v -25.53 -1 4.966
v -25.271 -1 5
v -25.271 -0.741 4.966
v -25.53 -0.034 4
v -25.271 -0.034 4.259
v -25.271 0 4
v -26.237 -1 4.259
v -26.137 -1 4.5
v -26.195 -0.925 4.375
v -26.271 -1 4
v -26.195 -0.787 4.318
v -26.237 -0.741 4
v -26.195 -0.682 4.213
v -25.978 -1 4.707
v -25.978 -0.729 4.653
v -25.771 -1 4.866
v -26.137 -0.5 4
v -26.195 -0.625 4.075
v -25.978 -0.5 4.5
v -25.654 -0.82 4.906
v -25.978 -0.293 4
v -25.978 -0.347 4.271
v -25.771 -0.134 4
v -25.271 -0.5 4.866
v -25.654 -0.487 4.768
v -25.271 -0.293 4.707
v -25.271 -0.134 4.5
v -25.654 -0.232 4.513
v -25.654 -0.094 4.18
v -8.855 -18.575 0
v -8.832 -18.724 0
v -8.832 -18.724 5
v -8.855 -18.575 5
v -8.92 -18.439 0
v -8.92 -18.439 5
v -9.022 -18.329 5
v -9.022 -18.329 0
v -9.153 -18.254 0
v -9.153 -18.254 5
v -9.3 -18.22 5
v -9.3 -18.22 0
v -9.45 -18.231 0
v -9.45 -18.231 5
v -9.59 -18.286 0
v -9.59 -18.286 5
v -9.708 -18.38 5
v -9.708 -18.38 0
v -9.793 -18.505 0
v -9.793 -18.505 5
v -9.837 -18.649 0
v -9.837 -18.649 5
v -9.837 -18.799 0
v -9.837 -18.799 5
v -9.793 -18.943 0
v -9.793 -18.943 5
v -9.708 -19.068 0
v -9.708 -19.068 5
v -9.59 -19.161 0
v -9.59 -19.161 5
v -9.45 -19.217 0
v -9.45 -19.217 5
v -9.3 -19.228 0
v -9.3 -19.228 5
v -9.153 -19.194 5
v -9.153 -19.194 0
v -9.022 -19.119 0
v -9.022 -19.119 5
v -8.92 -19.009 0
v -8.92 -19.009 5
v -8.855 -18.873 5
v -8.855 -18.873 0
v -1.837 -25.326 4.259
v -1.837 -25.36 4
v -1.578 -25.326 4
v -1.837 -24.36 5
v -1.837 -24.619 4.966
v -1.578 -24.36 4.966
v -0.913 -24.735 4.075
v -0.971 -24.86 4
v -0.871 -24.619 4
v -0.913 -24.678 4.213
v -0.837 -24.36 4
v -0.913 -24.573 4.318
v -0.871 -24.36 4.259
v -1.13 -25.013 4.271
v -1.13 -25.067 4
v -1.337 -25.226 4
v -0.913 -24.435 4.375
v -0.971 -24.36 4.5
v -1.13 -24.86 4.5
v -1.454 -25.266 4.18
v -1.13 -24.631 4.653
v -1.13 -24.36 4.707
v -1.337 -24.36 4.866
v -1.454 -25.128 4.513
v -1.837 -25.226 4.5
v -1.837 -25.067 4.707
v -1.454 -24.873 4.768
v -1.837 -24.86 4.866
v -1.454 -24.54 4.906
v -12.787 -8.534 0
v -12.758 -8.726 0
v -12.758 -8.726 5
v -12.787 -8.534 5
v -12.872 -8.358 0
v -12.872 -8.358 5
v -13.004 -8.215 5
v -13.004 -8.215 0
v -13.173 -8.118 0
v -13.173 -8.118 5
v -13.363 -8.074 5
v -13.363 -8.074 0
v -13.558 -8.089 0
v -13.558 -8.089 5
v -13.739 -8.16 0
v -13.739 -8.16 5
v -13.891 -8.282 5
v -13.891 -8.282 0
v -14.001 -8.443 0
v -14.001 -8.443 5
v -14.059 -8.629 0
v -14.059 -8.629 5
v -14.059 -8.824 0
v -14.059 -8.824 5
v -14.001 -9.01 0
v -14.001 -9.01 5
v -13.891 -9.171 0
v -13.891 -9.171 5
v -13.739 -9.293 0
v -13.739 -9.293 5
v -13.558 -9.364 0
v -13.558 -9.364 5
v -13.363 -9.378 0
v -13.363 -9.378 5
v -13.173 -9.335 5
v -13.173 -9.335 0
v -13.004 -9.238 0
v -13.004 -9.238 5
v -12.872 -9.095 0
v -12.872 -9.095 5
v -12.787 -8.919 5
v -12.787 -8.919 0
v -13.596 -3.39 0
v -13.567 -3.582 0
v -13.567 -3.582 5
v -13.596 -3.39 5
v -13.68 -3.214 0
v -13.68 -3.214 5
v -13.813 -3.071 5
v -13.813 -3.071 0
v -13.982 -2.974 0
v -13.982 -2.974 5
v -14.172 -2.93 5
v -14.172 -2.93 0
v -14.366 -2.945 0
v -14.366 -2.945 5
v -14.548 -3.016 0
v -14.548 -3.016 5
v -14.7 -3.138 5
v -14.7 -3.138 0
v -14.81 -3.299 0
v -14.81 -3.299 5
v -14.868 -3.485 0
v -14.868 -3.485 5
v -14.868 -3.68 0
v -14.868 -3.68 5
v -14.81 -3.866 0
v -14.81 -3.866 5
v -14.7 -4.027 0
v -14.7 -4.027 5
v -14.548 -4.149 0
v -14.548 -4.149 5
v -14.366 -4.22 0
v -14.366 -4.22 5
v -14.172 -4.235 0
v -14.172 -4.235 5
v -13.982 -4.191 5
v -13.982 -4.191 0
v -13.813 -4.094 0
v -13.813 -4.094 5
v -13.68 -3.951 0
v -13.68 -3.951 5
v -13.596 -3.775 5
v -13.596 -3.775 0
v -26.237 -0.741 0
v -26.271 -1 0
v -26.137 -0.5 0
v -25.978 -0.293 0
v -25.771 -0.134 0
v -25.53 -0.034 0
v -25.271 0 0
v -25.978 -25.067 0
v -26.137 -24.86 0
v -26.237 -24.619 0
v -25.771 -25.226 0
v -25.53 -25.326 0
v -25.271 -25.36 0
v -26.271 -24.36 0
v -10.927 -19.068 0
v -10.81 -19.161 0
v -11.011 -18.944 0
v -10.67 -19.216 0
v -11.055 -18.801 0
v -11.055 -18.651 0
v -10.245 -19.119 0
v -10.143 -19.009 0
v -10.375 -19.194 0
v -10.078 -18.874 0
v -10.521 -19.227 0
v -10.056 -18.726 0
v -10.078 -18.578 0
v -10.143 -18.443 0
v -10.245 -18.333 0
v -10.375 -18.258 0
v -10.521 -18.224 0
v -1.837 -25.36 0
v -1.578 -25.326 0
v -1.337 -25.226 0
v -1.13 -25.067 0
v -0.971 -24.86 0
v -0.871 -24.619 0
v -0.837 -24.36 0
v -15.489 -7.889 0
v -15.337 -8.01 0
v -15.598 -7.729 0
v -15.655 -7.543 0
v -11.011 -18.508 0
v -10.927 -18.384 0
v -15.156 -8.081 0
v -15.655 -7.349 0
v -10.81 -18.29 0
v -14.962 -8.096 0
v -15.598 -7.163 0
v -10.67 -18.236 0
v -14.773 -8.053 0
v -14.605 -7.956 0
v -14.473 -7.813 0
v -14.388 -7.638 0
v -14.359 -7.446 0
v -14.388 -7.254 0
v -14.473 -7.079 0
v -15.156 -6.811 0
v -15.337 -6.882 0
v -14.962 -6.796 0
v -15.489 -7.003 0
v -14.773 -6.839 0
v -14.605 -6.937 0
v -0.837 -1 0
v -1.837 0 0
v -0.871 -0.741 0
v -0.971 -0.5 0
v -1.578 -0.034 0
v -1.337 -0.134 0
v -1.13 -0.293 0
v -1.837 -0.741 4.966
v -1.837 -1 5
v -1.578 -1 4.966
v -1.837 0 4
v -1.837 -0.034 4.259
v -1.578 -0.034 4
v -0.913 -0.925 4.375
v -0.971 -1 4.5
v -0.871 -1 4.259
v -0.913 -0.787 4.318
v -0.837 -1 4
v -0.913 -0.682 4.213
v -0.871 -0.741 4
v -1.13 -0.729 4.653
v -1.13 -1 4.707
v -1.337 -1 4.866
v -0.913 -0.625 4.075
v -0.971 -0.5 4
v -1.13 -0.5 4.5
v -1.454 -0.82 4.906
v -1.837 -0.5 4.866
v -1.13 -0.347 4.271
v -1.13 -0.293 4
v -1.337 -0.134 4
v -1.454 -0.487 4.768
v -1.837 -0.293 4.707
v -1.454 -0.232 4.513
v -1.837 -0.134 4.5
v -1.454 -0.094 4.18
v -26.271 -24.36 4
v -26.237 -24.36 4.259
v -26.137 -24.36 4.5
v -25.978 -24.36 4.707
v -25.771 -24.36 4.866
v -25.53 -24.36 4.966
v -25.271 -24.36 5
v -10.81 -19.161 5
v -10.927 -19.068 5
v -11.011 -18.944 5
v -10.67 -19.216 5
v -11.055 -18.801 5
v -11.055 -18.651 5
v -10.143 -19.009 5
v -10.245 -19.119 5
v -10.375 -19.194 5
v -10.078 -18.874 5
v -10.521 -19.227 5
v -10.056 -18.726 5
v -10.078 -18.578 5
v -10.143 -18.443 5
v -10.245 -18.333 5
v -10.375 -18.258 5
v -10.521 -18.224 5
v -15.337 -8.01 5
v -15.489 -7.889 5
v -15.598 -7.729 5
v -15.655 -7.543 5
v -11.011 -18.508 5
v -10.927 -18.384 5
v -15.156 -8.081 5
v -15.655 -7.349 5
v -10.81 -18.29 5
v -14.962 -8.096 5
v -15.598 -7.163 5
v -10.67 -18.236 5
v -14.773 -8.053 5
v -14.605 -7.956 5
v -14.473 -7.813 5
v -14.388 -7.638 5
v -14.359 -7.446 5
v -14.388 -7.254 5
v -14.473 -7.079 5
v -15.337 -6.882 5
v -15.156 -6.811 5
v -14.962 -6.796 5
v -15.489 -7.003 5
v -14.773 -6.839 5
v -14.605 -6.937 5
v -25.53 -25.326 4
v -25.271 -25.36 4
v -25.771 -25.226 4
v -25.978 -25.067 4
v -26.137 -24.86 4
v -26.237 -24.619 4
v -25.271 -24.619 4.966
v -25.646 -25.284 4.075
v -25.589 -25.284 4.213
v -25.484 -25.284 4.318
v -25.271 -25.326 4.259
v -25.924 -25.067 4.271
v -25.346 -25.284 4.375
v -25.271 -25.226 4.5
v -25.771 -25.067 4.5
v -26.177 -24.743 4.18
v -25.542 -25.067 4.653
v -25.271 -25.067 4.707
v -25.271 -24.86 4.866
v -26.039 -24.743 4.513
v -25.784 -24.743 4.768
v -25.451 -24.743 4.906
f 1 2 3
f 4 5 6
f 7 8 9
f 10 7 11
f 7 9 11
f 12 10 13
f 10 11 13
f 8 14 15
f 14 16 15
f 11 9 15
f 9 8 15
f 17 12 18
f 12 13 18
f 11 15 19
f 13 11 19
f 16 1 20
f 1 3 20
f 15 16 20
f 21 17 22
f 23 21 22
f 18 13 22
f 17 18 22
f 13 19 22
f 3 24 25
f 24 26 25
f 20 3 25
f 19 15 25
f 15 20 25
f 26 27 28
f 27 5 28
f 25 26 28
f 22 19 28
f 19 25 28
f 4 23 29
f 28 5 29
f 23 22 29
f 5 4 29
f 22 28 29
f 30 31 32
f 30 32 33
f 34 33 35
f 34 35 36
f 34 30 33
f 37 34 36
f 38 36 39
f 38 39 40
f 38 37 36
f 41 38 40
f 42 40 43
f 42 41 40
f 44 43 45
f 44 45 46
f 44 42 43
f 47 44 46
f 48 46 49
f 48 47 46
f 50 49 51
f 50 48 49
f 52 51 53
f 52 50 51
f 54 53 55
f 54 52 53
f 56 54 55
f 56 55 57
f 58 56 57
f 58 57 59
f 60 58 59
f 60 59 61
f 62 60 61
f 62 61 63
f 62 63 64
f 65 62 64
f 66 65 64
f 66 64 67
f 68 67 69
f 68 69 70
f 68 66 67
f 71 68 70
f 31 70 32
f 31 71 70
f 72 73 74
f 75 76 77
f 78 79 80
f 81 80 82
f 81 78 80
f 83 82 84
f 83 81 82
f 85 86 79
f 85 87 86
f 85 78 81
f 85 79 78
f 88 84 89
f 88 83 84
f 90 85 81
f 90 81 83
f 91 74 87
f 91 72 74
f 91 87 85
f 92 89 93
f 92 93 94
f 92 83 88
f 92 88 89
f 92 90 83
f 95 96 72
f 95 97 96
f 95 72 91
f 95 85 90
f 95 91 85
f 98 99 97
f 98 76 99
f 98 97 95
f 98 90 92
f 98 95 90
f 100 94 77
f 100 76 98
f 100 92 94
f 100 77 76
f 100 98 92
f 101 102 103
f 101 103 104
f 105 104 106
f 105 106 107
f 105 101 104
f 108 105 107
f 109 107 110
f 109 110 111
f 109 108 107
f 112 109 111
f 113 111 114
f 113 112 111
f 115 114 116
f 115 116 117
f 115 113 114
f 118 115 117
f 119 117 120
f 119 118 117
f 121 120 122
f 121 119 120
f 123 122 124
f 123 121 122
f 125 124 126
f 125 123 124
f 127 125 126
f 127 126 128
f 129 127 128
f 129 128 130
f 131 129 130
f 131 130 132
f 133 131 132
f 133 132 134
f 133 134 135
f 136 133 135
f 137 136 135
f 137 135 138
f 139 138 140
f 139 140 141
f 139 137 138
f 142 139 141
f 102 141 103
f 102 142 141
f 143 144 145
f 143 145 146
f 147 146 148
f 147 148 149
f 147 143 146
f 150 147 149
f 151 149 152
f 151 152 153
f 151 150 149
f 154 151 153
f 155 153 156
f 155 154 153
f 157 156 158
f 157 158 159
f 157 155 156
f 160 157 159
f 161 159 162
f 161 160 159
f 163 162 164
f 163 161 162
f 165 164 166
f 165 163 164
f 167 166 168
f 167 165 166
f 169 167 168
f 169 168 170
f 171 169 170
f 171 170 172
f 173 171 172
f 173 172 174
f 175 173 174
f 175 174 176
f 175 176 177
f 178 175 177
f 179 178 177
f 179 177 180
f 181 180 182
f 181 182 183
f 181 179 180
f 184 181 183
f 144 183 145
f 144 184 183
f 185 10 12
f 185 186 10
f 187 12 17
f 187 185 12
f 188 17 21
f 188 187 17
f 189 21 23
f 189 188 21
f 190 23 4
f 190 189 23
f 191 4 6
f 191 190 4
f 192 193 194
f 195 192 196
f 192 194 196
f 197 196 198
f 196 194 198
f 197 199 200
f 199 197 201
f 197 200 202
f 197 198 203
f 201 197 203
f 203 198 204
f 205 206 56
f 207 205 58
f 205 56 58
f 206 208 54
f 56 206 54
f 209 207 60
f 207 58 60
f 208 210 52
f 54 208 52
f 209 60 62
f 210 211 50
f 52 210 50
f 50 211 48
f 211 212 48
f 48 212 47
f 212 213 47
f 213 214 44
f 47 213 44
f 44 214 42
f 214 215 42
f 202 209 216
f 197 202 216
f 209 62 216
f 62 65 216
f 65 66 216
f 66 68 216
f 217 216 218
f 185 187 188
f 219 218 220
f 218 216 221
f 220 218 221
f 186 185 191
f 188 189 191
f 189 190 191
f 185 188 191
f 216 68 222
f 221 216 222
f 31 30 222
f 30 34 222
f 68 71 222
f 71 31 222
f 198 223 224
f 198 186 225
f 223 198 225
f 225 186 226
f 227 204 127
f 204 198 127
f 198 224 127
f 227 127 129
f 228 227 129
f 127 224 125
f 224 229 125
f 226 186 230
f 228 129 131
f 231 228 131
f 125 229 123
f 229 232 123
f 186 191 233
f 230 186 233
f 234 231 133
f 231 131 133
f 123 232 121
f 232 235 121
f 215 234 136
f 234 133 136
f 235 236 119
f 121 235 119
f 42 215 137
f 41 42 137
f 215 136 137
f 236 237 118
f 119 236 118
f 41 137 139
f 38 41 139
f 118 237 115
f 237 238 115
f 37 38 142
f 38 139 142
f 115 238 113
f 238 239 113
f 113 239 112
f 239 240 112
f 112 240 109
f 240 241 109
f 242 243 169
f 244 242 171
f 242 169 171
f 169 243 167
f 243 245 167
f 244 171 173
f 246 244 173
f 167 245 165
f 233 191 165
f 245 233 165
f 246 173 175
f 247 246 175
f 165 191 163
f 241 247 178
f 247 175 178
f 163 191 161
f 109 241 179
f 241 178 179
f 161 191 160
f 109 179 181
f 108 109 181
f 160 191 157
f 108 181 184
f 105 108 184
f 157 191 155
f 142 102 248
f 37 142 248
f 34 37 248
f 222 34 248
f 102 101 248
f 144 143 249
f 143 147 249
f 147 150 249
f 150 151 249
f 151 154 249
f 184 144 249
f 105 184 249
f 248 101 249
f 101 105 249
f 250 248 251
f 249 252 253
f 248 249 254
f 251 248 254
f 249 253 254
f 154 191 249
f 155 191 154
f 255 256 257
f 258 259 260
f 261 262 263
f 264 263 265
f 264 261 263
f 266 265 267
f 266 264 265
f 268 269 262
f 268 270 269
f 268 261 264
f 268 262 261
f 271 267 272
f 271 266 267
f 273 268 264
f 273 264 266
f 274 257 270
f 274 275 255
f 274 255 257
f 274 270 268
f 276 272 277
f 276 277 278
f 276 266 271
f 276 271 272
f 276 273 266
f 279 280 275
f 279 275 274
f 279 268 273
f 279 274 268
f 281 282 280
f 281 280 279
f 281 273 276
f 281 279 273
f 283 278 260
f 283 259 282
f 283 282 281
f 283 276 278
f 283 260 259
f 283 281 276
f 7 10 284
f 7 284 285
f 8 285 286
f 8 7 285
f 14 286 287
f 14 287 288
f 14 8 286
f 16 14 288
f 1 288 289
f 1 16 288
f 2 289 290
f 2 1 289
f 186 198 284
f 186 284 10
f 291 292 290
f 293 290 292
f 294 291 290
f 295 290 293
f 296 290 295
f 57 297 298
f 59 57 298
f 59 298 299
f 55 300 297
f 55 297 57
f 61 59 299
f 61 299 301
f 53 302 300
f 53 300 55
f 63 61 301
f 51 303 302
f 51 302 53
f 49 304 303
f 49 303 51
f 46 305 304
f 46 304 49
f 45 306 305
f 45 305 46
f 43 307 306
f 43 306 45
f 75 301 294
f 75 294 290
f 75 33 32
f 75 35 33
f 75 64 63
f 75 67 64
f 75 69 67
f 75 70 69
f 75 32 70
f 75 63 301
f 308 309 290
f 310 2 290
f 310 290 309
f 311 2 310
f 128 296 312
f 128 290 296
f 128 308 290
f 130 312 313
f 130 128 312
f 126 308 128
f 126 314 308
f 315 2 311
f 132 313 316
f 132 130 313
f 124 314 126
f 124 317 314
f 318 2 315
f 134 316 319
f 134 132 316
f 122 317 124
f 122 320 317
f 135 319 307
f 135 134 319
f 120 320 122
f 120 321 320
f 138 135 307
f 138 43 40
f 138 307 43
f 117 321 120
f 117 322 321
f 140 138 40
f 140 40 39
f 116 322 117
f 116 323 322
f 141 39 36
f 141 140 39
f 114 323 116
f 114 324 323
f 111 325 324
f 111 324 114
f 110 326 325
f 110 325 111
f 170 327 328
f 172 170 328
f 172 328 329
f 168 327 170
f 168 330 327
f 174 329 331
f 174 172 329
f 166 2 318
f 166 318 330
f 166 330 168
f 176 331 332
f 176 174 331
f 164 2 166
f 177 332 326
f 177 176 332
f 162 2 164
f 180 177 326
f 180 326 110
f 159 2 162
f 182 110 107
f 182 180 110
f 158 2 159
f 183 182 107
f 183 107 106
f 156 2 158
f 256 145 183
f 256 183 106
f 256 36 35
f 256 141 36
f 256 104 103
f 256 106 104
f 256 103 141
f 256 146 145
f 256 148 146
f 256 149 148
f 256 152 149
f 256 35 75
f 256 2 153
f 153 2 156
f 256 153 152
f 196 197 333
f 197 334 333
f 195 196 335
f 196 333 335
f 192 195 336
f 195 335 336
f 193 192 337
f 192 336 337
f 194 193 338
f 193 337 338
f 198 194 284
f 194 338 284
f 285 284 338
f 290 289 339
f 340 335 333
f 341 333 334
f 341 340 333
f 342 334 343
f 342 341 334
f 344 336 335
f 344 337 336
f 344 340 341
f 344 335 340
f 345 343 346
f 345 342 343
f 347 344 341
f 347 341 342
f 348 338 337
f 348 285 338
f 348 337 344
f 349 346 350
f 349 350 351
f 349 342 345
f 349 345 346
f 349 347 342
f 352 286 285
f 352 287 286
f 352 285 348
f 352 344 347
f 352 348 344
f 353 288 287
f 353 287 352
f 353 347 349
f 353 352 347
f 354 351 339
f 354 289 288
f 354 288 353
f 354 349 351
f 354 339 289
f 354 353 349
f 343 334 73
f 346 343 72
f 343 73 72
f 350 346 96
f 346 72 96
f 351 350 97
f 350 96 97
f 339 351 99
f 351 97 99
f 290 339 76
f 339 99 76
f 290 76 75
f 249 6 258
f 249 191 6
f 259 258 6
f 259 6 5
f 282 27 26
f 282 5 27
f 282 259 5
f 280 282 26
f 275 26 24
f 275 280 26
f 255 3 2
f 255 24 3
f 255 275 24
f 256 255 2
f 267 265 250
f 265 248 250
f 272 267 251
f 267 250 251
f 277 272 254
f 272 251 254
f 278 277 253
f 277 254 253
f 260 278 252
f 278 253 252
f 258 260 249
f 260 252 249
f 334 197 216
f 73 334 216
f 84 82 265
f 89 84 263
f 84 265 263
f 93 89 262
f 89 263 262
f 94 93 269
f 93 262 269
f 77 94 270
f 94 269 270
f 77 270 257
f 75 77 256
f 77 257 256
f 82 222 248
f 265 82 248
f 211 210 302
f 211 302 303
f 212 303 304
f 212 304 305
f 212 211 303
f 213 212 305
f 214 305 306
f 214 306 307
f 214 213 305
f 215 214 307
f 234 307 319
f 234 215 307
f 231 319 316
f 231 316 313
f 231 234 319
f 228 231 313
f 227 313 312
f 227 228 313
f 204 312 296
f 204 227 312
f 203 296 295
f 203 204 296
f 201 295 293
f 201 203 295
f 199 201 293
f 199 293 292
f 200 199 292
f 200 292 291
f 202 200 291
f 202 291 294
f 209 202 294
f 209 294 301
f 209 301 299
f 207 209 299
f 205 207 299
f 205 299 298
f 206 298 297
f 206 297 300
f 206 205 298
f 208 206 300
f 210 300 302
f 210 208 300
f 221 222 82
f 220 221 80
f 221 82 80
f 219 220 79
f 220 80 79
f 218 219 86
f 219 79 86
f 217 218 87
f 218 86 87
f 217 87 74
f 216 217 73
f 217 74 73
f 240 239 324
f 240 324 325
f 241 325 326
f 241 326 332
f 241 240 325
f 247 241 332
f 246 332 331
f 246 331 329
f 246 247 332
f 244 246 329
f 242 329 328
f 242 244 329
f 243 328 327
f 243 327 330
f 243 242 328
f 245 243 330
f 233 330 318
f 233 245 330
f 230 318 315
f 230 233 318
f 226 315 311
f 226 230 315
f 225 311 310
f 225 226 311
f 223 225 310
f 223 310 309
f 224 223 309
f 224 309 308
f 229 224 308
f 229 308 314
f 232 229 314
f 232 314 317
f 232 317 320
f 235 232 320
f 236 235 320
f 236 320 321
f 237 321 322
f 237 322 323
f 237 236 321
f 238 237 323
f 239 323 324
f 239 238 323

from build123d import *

# Parameters (mm, degrees)
F0_W     = 25.434012
F0_H     = 25.360106
F0_R     = 0.502726
F0_R_2   = 0.505177
F0_R_3   = 0.651682
F0_R_4   = 0.654036
F0_R_5   = 0.653901
F1_DEPTH = 5
F2_R     = 1
F3_R     = 1
F4_R     = 1
F5_R     = 1


with BuildPart() as f1:
    # F0 (on Top) → F1 (new body)
    with BuildSketch(Plane.XY):
        with Locations((-13.553905, -12.680053)):
            Rectangle(F0_W, F0_H)
        with Locations((-10.558297, -18.72582)):
            Circle(F0_R, mode=Mode.SUBTRACT)
        with Locations((-9.337448, -18.723993)):
            Circle(F0_R_2, mode=Mode.SUBTRACT)
        with Locations((-15.011093, -7.446084)):
            Circle(F0_R_3, mode=Mode.SUBTRACT)
        with Locations((-14.220849, -3.582401)):
            Circle(F0_R_4, mode=Mode.SUBTRACT)
        with Locations((-13.412111, -8.726368)):
            Circle(F0_R_5, mode=Mode.SUBTRACT)
    extrude(amount=F1_DEPTH)

    # F2
    f2_edges = [f1.edges().sort_by_distance(p)[0] for p in [
        (-13.553905, 0, 5),
    ]]
    fillet(f2_edges, radius=F2_R)

    # F3
    f3_edges = [f1.edges().sort_by_distance(p)[0] for p in [
        (-26.270911, -13.180053, 5),
    ]]
    fillet(f3_edges, radius=F3_R)

    # F4
    f4_edges = [f1.edges().sort_by_distance(p)[0] for p in [
        (-13.053905, -25.360106, 5),
    ]]
    fillet(f4_edges, radius=F4_R)

    # F5
    f5_edges = [f1.edges().sort_by_distance(p)[0] for p in [
        (-0.836899, -12.680053, 5),
    ]]
    fillet(f5_edges, radius=F5_R)


solid = f1.part
